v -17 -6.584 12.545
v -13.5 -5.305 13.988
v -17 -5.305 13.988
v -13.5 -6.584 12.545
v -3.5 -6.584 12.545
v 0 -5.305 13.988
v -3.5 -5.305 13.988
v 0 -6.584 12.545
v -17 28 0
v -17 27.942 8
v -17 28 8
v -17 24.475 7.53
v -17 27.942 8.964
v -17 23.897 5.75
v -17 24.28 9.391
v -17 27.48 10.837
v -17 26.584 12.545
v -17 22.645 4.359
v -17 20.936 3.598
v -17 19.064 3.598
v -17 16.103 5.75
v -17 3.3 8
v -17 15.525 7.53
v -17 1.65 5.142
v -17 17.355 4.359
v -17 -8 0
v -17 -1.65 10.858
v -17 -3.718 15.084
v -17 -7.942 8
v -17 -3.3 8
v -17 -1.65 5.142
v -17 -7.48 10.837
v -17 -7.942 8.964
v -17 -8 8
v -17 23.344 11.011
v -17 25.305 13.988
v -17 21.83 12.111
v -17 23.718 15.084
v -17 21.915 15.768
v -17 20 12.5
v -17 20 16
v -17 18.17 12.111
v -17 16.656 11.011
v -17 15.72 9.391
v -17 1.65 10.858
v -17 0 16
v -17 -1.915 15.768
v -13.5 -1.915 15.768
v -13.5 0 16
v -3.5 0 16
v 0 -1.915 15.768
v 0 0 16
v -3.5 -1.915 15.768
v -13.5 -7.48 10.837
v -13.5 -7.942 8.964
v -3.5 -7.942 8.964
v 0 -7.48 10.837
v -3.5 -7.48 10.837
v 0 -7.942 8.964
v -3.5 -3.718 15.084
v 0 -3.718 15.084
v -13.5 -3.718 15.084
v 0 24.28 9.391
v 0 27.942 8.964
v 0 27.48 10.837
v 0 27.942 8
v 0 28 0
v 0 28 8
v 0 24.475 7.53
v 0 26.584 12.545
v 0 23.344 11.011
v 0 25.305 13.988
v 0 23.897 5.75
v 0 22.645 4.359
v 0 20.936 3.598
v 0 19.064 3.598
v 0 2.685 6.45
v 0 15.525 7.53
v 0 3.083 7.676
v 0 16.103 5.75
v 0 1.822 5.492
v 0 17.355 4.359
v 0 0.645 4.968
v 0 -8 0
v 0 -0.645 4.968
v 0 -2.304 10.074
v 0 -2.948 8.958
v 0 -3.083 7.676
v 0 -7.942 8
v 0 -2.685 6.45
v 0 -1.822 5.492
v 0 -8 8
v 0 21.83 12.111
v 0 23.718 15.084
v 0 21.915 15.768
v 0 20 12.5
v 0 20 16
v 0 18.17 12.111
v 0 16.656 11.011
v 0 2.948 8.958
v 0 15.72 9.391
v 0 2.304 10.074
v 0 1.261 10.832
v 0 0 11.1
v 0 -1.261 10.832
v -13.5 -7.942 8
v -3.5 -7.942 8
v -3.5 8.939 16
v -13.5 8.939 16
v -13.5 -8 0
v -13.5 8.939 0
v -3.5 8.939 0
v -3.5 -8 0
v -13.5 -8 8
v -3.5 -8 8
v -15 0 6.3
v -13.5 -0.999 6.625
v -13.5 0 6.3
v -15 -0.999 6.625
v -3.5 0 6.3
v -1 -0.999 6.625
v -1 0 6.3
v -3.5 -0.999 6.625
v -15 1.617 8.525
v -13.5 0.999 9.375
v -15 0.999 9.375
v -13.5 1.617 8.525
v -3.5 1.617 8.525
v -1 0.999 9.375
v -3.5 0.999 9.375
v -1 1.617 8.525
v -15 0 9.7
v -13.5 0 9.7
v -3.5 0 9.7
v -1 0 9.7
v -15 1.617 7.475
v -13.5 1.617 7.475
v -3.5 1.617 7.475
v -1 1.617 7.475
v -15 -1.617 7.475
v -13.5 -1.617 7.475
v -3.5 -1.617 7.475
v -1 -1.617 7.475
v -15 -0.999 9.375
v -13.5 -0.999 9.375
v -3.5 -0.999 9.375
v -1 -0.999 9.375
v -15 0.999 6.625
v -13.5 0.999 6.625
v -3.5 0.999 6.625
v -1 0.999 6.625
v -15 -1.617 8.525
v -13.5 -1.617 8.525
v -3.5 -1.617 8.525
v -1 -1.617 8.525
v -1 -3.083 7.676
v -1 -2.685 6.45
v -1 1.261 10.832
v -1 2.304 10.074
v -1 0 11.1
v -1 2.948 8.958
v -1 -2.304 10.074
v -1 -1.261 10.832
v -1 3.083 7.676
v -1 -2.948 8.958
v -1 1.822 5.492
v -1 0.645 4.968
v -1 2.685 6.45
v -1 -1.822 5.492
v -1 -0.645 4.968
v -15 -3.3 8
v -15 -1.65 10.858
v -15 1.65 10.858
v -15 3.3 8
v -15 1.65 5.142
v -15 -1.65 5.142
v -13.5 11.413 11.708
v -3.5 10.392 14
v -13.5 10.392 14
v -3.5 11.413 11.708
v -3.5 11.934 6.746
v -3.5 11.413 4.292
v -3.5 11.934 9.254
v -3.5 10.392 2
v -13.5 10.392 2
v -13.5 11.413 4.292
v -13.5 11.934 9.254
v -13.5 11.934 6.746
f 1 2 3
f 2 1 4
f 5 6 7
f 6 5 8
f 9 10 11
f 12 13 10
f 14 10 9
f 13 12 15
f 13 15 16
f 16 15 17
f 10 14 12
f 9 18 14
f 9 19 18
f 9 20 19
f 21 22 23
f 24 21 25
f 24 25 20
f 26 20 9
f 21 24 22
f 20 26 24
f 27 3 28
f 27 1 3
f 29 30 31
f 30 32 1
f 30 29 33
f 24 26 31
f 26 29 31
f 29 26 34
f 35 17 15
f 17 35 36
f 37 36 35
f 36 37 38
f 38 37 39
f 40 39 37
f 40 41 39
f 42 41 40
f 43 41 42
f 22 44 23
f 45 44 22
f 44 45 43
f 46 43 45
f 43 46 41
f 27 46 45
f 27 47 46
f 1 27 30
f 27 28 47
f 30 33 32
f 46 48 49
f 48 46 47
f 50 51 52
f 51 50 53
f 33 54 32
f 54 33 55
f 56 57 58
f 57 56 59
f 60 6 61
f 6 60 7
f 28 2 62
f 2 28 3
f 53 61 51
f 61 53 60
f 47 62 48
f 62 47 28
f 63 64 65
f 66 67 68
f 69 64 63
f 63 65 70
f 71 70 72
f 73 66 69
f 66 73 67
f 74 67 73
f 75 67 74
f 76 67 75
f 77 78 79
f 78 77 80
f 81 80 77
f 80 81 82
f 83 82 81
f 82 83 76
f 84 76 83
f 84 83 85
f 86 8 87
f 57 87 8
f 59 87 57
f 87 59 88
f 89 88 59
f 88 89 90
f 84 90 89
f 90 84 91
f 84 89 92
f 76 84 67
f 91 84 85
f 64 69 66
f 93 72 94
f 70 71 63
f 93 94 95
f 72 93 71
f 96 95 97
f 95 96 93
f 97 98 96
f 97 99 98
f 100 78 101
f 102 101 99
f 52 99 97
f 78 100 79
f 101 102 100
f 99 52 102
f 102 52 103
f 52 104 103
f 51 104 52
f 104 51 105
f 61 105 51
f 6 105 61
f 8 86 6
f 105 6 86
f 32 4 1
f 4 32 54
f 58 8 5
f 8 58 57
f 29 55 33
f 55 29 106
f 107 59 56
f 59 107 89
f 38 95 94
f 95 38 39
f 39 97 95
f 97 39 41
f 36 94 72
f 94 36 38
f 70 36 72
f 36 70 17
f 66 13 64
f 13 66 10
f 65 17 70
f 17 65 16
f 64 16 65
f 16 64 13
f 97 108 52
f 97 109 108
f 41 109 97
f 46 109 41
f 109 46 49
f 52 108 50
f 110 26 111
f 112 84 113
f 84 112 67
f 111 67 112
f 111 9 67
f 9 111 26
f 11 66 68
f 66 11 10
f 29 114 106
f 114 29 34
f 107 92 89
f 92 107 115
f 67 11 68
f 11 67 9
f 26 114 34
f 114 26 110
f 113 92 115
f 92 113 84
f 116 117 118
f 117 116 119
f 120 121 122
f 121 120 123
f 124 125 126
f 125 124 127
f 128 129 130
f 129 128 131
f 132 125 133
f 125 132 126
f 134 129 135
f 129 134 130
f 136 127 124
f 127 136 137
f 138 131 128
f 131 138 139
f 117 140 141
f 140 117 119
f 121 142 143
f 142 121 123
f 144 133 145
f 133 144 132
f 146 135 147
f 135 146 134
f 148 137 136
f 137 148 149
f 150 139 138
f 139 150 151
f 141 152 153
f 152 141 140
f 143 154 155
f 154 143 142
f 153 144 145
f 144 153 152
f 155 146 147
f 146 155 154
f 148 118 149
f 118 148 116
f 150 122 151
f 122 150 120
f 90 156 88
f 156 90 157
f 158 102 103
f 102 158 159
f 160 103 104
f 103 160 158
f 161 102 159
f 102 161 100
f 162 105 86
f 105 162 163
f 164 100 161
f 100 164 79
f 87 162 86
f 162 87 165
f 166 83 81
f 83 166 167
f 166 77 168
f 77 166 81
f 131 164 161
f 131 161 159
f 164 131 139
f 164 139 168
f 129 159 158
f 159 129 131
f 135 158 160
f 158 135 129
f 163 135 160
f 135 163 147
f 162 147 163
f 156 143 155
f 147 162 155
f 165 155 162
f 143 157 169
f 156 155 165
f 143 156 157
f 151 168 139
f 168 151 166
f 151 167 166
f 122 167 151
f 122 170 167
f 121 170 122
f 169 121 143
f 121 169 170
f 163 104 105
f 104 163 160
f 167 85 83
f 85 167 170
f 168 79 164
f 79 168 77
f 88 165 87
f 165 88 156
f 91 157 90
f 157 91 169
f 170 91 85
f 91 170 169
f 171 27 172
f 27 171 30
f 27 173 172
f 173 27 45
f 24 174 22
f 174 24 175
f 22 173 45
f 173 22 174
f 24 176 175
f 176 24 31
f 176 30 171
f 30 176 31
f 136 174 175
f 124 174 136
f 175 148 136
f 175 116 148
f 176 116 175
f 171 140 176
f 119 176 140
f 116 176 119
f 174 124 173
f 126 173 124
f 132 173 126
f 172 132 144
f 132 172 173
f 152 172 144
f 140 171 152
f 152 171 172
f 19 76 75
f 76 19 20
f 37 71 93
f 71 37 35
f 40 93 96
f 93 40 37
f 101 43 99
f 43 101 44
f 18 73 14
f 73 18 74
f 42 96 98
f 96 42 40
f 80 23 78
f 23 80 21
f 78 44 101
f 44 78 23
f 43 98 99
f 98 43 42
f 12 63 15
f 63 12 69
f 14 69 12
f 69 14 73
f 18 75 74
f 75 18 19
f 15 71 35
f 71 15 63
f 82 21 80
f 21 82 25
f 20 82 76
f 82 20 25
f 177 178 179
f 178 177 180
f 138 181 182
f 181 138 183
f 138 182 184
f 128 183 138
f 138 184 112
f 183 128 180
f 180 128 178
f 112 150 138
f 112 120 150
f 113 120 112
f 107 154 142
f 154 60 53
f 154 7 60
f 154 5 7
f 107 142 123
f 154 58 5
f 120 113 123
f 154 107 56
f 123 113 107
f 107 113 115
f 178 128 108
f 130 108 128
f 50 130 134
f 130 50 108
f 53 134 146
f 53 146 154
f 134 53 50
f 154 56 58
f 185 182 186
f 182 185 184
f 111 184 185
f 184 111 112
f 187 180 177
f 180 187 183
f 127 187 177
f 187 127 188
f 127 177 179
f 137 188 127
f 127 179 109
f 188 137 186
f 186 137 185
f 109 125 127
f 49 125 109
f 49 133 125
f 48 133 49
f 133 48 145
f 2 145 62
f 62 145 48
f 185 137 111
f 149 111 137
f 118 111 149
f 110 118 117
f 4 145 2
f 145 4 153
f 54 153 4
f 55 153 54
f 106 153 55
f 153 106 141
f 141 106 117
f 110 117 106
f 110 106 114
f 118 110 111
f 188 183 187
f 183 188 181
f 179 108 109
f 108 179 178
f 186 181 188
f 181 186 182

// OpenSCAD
// PRUSA iteration3
// Y idler
// GNU GPL v3
// Josef Průša <iam@josefprusa.cz> and contributors
// http://www.reprap.org/wiki/Prusa_Mendel
// http://prusamendel.org


module y_idler_base() {
  translate(v = [0,0,0]) cylinder(h = 17, r = 8);
  translate(v = [0,20,0]) cylinder(h = 17, r = 8);
  translate(v = [0,10,8.5]) cube(size = [16, 20, 17], center = true);
  translate(v = [-4,10,8.5]) cube(size = [8, 16+20, 17], center = true);
}

module y_idler_holes() {
  translate(v = [0,0,-1]) cylinder(h = 120, r = 1.7, $fn = 10);
  translate(v = [0,0,-1]) cylinder(h = 2, r = 3.1, $fn = 15);
  translate(v = [0,0,15]) rotate([0,0,30]) cylinder(h = 3, r = 3.3, $fn = 6);
  translate(v = [0,20,-1]) cylinder(h = 25, r = 4.5);
  translate(v = [0,0,3.5]) cylinder(h = 10, r = 12);
}


// Final part
module y_idler() {
  translate(v = [0,0,8])rotate([0,-90,0]) difference() {
    y_idler_base();
    y_idler_holes();
  }
}

y_idler();
